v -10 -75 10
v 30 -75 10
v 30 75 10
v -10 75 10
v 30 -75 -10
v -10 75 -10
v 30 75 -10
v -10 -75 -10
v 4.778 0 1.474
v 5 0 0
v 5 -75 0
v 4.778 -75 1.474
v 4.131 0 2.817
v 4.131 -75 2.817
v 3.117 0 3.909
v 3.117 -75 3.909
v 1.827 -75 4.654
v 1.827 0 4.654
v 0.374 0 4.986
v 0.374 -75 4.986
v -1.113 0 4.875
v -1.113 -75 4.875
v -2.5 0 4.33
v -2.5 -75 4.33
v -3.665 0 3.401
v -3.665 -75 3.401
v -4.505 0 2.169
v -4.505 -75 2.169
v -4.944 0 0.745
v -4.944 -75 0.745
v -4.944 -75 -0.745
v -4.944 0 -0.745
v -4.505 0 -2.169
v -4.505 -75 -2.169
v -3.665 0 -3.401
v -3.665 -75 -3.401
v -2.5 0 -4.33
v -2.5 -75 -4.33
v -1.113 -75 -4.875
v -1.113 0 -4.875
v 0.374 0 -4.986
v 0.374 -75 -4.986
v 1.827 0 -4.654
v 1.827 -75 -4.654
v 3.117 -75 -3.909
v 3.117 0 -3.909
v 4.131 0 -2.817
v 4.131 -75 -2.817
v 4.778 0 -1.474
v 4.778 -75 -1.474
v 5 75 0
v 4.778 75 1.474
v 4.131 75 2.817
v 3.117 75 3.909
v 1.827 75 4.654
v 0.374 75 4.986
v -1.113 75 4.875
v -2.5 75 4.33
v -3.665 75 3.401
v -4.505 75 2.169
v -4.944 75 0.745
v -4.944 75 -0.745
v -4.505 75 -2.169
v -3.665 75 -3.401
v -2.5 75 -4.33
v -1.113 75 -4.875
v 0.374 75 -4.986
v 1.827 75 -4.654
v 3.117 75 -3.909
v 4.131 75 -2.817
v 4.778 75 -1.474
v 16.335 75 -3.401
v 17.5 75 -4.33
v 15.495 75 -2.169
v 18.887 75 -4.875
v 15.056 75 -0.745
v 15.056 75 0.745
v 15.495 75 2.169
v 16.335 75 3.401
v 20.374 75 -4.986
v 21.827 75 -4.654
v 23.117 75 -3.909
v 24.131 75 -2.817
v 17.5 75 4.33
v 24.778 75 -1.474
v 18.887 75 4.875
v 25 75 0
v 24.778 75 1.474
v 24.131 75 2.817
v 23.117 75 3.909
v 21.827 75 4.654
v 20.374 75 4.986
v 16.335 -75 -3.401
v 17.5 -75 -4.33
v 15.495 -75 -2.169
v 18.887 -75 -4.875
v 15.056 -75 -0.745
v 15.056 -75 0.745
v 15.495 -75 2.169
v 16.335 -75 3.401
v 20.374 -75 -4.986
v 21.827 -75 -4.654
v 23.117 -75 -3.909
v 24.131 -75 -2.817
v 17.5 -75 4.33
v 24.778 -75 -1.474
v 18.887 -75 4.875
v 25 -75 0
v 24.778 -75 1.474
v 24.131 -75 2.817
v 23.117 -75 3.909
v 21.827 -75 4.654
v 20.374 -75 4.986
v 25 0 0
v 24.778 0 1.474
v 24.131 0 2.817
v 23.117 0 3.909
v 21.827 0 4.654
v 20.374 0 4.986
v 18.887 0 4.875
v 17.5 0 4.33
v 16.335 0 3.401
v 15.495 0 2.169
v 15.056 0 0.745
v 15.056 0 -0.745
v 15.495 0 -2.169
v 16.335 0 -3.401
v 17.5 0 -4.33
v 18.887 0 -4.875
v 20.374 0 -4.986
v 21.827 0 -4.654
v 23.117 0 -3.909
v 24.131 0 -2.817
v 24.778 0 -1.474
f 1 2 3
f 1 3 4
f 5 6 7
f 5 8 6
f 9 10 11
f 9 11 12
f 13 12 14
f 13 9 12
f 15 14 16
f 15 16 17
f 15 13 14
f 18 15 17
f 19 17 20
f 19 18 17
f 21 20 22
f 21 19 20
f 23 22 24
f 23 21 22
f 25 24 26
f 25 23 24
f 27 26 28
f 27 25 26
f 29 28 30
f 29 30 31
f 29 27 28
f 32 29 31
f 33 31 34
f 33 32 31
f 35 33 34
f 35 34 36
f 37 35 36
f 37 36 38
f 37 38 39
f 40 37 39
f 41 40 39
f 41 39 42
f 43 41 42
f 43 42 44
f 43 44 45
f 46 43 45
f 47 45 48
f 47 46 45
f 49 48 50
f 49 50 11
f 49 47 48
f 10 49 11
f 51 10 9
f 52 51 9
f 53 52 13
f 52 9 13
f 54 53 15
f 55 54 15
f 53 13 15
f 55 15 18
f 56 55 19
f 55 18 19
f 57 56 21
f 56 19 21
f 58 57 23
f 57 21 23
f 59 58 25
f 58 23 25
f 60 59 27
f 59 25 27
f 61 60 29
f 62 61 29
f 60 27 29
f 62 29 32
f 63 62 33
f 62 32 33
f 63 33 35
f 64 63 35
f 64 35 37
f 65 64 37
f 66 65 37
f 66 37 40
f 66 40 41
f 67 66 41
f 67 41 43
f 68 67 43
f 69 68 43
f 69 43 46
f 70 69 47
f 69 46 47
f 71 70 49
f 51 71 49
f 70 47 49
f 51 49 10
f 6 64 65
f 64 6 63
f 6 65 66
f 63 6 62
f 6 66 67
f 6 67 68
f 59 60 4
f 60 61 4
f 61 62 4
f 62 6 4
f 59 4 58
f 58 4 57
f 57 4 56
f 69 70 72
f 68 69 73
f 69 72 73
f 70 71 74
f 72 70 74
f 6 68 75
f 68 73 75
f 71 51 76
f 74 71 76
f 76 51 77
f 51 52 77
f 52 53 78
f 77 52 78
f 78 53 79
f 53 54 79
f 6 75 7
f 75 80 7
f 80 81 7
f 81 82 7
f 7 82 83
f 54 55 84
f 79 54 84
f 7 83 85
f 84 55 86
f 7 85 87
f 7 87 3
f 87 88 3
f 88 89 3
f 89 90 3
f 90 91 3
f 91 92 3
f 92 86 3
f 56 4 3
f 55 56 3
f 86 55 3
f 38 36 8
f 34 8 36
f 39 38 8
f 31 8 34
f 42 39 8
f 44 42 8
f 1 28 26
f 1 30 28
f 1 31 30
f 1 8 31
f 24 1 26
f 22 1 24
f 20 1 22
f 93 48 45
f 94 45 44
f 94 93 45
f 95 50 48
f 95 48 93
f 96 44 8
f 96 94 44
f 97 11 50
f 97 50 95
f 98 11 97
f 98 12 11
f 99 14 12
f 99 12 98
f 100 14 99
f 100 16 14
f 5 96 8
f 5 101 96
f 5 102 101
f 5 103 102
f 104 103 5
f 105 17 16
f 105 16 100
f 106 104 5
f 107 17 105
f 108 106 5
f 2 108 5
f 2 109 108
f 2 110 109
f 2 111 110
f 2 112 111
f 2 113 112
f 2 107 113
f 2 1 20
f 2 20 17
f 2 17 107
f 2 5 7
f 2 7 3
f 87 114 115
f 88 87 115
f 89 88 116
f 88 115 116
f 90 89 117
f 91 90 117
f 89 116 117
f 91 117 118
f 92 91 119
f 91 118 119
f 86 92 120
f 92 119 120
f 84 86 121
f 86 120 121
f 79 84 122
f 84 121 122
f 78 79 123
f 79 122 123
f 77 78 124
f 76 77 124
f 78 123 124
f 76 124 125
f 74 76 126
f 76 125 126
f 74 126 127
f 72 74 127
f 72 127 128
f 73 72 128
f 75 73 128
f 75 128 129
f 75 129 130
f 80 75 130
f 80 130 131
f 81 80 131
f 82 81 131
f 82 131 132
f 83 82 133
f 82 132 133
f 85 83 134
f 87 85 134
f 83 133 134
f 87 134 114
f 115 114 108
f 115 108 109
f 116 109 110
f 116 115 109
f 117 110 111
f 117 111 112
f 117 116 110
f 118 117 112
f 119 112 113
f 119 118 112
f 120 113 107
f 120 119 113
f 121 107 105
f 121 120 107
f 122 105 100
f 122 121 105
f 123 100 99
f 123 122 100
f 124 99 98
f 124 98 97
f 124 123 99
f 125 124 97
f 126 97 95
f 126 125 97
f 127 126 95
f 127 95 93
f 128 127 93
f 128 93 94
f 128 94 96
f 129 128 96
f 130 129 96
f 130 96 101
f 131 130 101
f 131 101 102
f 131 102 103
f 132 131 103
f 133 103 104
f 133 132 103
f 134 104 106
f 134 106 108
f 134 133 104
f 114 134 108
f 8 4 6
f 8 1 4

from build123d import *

# Parameters (mm, degrees)
F0_R          = 5
F1_DEPTH      = 75
F1_DEPTH_BACK = 75


with BuildPart() as f1:
    # F0 (on Front) → F1 (new body, two sides)
    with BuildSketch(Plane.XZ) as f1_sk:
        Polygon((-10, -10), (10, -10), (30, -10), (30, 10), (10, 10), (-10, 10), align=None)
        Circle(F0_R, mode=Mode.SUBTRACT)
        with Locations((20, 0)):
            Circle(F0_R, mode=Mode.SUBTRACT)
    extrude(amount=F1_DEPTH)
    extrude(f1_sk.sketch, amount=-F1_DEPTH_BACK)


solid = f1.part
